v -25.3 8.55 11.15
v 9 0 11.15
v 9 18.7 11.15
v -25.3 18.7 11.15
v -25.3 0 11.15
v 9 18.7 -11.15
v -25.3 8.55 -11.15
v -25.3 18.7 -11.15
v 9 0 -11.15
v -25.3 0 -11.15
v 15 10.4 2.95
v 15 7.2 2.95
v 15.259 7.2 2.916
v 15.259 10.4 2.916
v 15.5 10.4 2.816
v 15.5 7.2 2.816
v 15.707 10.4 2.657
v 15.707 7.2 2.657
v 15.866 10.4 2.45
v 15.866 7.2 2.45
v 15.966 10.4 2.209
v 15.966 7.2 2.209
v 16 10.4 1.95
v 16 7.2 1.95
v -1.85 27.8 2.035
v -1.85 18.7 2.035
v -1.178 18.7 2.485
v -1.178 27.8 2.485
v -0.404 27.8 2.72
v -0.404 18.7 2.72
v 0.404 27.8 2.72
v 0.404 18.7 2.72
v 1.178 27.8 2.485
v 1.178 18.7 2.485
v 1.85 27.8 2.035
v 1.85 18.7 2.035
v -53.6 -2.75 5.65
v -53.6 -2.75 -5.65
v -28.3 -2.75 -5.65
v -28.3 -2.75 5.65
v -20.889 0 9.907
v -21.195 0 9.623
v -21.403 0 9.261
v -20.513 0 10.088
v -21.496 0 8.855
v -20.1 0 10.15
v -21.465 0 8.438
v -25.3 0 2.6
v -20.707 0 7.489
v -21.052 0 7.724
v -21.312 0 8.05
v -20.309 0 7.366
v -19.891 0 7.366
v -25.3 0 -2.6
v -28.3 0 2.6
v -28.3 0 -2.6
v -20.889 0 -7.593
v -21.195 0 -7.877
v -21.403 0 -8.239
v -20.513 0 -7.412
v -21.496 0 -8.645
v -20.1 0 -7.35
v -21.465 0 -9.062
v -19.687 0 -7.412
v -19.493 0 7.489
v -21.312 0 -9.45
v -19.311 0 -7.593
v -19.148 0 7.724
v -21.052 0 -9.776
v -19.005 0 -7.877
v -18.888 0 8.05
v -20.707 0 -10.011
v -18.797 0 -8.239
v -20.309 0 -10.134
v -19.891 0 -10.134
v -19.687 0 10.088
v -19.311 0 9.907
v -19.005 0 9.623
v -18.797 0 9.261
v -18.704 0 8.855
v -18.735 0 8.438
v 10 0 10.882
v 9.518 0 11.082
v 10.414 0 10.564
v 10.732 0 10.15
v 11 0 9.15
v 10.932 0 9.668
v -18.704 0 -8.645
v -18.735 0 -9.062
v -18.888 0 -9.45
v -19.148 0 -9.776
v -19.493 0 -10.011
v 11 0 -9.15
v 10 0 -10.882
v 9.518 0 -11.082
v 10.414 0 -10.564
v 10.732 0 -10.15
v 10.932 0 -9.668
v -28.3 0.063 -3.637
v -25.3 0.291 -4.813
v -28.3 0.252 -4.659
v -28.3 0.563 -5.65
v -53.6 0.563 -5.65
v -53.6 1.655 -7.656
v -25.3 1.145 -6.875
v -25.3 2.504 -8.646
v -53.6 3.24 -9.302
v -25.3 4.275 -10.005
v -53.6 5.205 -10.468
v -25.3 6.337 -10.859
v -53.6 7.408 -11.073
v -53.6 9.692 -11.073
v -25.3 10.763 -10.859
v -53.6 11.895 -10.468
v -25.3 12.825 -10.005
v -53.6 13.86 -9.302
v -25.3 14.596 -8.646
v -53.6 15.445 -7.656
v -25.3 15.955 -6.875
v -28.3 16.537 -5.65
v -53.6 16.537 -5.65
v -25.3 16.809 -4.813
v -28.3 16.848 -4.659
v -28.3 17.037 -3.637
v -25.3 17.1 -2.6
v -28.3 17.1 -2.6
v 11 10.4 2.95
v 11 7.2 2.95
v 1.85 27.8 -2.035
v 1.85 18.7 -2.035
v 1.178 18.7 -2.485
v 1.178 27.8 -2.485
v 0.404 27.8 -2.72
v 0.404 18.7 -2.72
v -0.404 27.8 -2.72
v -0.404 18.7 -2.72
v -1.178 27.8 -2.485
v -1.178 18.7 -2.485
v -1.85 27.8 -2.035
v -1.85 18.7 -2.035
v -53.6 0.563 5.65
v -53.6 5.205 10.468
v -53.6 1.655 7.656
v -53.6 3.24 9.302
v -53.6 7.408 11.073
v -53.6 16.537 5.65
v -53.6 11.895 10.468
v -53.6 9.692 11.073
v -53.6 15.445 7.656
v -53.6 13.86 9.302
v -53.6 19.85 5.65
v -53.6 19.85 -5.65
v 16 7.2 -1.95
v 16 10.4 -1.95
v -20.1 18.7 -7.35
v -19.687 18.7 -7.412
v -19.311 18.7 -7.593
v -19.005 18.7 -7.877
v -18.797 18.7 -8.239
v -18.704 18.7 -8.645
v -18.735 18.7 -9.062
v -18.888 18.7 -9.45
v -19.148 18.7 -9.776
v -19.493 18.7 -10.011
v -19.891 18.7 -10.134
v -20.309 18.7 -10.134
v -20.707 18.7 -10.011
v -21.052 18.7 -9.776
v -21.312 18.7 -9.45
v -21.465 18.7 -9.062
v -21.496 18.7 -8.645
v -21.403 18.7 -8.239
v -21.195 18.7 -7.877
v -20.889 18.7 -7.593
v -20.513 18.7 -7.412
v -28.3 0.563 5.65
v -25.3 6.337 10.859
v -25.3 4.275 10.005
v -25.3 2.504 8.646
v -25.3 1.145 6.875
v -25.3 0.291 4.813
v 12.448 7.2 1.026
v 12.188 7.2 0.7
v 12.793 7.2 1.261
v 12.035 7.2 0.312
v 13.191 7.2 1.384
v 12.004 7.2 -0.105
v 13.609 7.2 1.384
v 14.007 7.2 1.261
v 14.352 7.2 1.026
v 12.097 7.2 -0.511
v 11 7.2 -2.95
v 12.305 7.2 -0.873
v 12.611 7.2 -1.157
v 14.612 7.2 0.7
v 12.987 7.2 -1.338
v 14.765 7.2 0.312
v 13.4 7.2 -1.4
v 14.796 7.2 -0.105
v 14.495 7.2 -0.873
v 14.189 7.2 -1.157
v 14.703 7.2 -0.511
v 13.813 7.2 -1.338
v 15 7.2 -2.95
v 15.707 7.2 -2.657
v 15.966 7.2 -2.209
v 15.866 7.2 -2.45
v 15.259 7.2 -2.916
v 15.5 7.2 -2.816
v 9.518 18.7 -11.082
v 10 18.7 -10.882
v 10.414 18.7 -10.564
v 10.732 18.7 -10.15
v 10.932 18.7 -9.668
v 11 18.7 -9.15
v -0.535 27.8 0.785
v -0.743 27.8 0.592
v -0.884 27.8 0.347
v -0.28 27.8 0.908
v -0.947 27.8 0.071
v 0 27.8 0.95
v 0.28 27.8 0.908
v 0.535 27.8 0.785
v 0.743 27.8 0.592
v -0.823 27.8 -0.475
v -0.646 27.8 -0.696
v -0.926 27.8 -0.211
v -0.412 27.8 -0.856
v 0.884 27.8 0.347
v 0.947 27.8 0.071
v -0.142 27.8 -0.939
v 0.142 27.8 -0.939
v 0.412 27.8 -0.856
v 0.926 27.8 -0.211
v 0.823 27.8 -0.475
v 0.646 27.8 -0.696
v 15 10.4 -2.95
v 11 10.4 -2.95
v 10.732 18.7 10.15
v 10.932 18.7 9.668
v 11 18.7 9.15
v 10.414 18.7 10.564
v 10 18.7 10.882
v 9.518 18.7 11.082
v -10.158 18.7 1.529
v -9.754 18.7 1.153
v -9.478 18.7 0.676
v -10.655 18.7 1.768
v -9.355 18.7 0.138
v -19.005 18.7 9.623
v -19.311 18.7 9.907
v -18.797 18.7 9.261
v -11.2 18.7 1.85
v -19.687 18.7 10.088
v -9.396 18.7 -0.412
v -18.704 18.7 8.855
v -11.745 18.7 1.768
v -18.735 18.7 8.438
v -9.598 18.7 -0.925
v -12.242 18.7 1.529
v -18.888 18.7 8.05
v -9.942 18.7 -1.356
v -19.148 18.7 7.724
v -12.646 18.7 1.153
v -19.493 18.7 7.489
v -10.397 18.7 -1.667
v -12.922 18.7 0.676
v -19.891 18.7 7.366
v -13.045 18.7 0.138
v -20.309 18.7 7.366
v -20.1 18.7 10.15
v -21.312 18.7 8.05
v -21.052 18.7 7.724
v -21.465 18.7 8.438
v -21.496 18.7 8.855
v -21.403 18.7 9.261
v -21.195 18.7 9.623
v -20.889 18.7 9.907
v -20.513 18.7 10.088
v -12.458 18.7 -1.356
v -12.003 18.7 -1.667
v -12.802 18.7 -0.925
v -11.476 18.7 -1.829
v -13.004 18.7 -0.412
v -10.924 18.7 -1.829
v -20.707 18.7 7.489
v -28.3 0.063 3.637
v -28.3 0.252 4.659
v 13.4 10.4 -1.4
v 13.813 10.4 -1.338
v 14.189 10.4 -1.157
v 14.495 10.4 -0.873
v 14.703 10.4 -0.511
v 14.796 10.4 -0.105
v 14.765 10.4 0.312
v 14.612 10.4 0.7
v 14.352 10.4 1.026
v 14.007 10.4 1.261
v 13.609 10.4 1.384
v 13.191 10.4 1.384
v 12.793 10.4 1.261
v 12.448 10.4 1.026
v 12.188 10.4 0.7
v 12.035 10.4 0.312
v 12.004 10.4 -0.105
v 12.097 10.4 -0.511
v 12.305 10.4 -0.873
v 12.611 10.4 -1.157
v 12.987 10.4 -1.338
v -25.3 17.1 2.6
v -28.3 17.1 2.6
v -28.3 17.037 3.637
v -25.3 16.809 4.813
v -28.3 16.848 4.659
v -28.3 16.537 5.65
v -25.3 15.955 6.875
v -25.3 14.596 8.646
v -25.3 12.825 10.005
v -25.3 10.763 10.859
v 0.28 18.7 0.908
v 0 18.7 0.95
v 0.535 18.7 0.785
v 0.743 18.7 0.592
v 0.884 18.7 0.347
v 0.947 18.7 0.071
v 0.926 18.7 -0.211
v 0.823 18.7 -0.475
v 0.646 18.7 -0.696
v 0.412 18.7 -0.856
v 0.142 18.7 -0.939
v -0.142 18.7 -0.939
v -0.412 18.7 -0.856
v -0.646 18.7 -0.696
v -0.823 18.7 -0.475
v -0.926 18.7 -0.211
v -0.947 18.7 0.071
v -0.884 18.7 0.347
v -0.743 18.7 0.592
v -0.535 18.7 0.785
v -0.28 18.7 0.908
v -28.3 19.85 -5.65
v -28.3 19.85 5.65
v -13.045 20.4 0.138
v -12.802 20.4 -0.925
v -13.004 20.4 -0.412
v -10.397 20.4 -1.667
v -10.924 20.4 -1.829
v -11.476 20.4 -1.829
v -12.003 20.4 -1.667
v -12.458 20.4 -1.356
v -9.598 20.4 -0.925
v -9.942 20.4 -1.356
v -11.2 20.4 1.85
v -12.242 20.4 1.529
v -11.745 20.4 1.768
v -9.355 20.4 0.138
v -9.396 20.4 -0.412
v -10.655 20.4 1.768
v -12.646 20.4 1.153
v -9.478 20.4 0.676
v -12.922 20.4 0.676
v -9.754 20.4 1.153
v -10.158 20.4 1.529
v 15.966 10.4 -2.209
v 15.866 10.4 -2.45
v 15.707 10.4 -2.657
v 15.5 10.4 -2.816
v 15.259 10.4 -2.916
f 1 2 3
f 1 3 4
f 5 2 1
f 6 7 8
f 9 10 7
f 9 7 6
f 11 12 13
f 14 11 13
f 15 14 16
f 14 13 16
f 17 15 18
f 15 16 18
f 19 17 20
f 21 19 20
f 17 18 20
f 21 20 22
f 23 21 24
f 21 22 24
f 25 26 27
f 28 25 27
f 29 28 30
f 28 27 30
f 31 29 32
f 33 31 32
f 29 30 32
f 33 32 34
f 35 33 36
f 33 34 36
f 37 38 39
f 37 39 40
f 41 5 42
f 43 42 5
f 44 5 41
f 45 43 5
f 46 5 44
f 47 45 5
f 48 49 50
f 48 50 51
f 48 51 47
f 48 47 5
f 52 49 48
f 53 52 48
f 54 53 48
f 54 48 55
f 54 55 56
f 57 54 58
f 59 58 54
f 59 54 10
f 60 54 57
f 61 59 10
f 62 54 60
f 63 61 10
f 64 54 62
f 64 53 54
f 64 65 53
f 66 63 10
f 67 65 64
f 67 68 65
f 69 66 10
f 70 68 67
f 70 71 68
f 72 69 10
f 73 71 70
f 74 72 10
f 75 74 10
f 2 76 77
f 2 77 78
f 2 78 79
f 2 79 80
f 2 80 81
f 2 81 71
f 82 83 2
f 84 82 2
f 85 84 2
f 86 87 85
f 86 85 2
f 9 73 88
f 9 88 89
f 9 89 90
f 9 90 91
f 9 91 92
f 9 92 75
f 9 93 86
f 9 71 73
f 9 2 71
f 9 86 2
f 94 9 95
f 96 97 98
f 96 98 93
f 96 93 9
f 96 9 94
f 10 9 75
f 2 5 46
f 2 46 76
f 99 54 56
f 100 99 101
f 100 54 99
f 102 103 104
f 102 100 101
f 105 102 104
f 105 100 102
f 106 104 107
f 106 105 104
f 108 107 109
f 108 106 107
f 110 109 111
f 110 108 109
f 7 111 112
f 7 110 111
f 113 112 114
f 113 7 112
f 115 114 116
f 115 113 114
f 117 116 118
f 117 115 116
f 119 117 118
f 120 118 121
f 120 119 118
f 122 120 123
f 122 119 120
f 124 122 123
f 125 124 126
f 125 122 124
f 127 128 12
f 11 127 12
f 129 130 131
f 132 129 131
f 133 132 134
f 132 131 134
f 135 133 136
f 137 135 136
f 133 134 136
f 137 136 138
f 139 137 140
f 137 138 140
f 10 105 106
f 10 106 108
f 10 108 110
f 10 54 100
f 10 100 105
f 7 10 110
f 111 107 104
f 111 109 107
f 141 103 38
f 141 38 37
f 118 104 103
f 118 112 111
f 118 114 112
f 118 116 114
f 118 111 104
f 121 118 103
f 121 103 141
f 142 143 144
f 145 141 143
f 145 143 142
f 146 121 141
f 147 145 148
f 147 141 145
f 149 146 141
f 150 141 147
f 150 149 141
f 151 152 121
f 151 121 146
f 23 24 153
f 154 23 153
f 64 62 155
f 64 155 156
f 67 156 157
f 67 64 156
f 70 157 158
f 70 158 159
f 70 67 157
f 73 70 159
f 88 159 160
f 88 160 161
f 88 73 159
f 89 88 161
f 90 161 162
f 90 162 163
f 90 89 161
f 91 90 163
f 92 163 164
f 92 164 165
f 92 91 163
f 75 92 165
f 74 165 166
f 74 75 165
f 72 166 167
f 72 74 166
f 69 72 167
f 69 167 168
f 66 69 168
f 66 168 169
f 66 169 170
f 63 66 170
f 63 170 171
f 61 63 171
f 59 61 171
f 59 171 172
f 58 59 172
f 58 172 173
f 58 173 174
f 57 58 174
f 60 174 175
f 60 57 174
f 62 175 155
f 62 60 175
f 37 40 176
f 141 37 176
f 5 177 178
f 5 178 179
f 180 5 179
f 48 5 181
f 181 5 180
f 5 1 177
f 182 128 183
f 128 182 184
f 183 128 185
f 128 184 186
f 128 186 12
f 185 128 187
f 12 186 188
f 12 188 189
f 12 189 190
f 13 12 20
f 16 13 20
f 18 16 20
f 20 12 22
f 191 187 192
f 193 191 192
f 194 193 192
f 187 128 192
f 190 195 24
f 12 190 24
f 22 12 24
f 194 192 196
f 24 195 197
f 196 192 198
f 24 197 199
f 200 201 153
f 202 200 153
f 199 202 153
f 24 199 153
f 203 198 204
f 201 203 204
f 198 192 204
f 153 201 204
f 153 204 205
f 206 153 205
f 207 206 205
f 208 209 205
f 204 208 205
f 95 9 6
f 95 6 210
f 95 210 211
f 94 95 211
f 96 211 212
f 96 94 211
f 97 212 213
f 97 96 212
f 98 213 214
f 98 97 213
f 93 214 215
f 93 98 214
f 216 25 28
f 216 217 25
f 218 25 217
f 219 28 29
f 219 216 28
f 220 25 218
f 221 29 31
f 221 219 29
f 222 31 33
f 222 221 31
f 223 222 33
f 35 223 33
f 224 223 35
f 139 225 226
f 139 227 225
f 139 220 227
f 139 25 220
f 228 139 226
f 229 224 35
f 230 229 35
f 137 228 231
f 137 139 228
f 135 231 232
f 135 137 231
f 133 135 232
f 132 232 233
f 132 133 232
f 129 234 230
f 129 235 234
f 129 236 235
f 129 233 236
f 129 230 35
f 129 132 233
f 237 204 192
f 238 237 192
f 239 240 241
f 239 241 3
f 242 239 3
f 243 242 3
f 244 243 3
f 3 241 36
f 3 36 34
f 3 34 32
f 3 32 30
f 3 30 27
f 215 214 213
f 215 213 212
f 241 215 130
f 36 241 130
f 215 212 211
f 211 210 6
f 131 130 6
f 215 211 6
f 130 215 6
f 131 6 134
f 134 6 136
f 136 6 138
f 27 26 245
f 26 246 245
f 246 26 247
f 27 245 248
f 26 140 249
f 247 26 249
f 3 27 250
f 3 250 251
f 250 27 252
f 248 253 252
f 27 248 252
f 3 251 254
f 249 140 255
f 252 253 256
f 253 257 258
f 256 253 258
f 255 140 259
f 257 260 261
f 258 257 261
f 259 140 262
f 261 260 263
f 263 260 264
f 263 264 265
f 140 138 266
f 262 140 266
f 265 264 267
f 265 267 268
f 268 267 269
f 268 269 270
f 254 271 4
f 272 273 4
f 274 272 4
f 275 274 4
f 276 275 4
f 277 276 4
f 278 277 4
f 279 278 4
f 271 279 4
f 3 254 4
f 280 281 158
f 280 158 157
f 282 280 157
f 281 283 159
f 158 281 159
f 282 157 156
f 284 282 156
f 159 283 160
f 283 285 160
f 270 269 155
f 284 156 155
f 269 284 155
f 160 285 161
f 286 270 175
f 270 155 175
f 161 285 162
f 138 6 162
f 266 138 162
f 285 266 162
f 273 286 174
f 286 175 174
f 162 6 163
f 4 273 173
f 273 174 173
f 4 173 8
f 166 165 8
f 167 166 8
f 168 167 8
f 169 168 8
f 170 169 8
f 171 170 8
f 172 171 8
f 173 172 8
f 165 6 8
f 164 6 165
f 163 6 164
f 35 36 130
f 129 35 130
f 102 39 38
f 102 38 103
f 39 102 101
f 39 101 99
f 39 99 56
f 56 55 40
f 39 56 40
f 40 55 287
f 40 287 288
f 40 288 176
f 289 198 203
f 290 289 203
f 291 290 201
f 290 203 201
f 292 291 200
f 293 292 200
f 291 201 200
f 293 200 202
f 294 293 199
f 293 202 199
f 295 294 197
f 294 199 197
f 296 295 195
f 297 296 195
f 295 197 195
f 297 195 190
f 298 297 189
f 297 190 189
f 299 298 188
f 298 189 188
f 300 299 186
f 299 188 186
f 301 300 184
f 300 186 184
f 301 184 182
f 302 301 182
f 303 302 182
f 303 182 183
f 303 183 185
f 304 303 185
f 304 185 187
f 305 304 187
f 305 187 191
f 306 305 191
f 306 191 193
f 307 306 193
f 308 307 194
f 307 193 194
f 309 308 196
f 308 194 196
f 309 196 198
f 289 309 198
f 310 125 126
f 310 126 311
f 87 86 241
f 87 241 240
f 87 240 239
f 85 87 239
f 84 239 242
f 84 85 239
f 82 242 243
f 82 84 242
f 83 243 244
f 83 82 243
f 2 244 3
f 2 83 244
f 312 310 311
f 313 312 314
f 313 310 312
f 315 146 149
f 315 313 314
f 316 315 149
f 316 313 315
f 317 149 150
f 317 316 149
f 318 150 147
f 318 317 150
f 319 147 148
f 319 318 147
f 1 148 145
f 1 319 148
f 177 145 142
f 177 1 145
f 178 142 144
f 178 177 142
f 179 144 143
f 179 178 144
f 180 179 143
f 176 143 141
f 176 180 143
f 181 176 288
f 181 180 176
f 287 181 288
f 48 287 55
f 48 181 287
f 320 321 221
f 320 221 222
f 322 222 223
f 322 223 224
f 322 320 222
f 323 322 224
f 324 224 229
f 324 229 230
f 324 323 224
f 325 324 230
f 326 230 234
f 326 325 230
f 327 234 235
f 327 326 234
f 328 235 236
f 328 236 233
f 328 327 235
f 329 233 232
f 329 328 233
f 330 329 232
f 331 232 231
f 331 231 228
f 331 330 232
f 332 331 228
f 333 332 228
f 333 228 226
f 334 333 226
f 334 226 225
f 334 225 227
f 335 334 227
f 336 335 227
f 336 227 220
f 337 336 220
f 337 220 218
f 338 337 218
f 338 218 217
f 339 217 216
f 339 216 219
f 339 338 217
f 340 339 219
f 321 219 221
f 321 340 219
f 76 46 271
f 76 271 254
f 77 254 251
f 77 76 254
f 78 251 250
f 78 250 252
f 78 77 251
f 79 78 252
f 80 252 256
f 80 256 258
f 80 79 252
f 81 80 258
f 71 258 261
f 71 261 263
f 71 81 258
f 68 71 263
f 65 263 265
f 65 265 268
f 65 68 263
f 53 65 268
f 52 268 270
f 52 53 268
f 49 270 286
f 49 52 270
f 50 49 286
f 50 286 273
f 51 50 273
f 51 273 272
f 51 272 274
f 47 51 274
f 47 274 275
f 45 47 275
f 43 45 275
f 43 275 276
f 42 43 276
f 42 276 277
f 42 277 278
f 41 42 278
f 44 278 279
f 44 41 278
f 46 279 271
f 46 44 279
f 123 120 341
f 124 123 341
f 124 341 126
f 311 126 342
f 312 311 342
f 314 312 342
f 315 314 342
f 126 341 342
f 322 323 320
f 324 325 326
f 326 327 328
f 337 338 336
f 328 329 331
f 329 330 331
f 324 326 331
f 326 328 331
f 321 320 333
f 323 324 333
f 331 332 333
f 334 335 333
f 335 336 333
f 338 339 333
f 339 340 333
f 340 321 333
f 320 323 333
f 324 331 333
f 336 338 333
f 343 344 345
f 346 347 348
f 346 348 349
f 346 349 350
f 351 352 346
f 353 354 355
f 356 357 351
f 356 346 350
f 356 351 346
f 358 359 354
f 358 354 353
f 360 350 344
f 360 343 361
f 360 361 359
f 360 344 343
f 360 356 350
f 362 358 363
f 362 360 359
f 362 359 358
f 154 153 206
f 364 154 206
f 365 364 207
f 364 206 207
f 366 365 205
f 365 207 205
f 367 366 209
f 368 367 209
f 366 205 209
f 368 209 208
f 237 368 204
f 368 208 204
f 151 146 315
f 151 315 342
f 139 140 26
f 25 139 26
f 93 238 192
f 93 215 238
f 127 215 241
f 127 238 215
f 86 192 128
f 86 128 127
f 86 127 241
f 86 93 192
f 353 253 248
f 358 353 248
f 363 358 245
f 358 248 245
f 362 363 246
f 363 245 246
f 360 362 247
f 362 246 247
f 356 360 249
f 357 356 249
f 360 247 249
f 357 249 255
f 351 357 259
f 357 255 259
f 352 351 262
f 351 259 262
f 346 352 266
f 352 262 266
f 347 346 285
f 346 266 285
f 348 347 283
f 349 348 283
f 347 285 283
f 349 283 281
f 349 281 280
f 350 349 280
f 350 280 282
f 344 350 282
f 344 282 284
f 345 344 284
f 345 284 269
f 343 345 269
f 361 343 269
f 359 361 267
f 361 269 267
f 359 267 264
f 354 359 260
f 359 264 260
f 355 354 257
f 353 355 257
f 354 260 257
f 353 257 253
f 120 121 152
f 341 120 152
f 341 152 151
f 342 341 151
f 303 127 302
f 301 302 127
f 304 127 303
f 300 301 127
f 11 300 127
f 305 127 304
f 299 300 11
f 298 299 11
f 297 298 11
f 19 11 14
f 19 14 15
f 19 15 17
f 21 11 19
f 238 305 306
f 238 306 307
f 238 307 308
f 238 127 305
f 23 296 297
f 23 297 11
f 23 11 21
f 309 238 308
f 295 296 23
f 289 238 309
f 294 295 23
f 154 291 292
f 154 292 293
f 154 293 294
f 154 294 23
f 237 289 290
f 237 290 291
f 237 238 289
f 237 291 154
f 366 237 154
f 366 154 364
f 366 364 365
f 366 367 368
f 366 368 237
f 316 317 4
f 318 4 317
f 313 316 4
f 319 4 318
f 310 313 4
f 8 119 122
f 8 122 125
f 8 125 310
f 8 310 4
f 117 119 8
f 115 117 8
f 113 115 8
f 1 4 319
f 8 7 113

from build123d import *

# Parameters (mm, degrees)
SKETCH1_R           = 1.4
BOSS_EXTRUDE1_DEPTH = 18.7
SKETCH2_R           = 0.95
BOSS_EXTRUDE2_DEPTH = 9.1
SKETCH3_R           = 1.85
BOSS_EXTRUDE3_DEPTH = 1.7
SKETCH4_R           = 1.4
BOSS_EXTRUDE4_DEPTH = 3.2
BOSS_EXTRUDE5_DEPTH = 28.3
SKETCH7_W           = 11.3
SKETCH7_H           = 22.6
BOSS_EXTRUDE6_DEPTH = 25.3


with BuildPart() as part:
    # Sketch1 → Boss-Extrude1 (new body)
    with BuildSketch(Plane(origin=(0, 0, 0), x_dir=(1, 0, 0), z_dir=(0, 1, 0))):
        with BuildLine():
            Line((-25.3, 11.15), (9, 11.15))
            ThreePointArc((9, 11.15), (10.414213562, 10.564213562), (11, 9.15))
            Line((11, 9.15), (11, -9.15))
            ThreePointArc((11, -9.15), (10.414213562, -10.564213562), (9, -11.15))
            Line((9, -11.15), (-25.3, -11.15))
            Line((-25.3, -11.15), (-25.3, 11.15))
        make_face()
        with Locations(Location((-20.1, 8.75, 0), (0, 0, 270))):
            Circle(SKETCH1_R, mode=Mode.SUBTRACT)
        with Locations(Location((-20.1, -8.75, 0), (0, 0, 270))):
            Circle(SKETCH1_R, mode=Mode.SUBTRACT)
    extrude(amount=BOSS_EXTRUDE1_DEPTH)

    # Sketch2 → Boss-Extrude2 (add)
    with BuildSketch(Plane(origin=(0, 18.7, 0), x_dir=(1, 0, 0), z_dir=(0, 1, 0))):
        with BuildLine():
            ThreePointArc((1.85, 2.034698995), (0, 2.75), (-1.85, 2.034698995))
            Line((-1.85, 2.034698995), (-1.85, -2.034698995))
            ThreePointArc((-1.85, -2.034698995), (0, -2.75), (1.85, -2.034698995))
            Line((1.85, -2.034698995), (1.85, 2.034698995))
        make_face()
        with Locations(Location((0, 0, 0), (0, 0, 270))):
            Circle(SKETCH2_R, mode=Mode.SUBTRACT)
    extrude(amount=BOSS_EXTRUDE2_DEPTH)

    # Sketch3 → Boss-Extrude3 (add)
    with BuildSketch(Plane(origin=(0, 18.7, 0), x_dir=(1, 0, 0), z_dir=(0, 1, 0))):
        with Locations(Location((-11.2, 0, 0), (0, 0, 270))):
            Circle(SKETCH3_R)
    extrude(amount=BOSS_EXTRUDE3_DEPTH)

    # Sketch4 → Boss-Extrude4 (add)
    with BuildSketch(Plane(origin=(0, 7.2, 0), x_dir=(-1, 0, 0), z_dir=(0, -1, 0))):
        with BuildLine():
            Line((-11, -2.95), (-15, -2.95))
            ThreePointArc((-15, -2.95), (-15.707106781, -2.657106781), (-16, -1.95))
            Line((-16, -1.95), (-16, 1.95))
            ThreePointArc((-16, 1.95), (-15.707106781, 2.657106781), (-15, 2.95))
            Line((-15, 2.95), (-11, 2.95))
            Line((-11, 2.95), (-11, -2.95))
        make_face()
        with Locations(Location((-13.4, 0, 0), (0, 0, 90))):
            Circle(SKETCH4_R, mode=Mode.SUBTRACT)
    extrude(amount=-BOSS_EXTRUDE4_DEPTH)

    # Sketch5 → Boss-Extrude5 (add)
    with BuildSketch(Plane.ZY.offset(25.3)):
        with BuildLine():
            Line((-2.6, 17.1), (2.6, 17.1))
            ThreePointArc((2.6, 17.1), (11.15, 8.55), (2.6, 0))
            Line((2.6, 0), (-2.6, 0))
            ThreePointArc((-2.6, 0), (-11.15, 8.55), (-2.6, 17.1))
        make_face()
    extrude(amount=BOSS_EXTRUDE5_DEPTH)

    # Sketch7 → Boss-Extrude6 (add)
    with BuildSketch(Plane.ZY.offset(53.6)):
        with Locations((0, 8.55)):
            Rectangle(SKETCH7_W, SKETCH7_H)
    extrude(amount=-BOSS_EXTRUDE6_DEPTH)


solid = part.part
